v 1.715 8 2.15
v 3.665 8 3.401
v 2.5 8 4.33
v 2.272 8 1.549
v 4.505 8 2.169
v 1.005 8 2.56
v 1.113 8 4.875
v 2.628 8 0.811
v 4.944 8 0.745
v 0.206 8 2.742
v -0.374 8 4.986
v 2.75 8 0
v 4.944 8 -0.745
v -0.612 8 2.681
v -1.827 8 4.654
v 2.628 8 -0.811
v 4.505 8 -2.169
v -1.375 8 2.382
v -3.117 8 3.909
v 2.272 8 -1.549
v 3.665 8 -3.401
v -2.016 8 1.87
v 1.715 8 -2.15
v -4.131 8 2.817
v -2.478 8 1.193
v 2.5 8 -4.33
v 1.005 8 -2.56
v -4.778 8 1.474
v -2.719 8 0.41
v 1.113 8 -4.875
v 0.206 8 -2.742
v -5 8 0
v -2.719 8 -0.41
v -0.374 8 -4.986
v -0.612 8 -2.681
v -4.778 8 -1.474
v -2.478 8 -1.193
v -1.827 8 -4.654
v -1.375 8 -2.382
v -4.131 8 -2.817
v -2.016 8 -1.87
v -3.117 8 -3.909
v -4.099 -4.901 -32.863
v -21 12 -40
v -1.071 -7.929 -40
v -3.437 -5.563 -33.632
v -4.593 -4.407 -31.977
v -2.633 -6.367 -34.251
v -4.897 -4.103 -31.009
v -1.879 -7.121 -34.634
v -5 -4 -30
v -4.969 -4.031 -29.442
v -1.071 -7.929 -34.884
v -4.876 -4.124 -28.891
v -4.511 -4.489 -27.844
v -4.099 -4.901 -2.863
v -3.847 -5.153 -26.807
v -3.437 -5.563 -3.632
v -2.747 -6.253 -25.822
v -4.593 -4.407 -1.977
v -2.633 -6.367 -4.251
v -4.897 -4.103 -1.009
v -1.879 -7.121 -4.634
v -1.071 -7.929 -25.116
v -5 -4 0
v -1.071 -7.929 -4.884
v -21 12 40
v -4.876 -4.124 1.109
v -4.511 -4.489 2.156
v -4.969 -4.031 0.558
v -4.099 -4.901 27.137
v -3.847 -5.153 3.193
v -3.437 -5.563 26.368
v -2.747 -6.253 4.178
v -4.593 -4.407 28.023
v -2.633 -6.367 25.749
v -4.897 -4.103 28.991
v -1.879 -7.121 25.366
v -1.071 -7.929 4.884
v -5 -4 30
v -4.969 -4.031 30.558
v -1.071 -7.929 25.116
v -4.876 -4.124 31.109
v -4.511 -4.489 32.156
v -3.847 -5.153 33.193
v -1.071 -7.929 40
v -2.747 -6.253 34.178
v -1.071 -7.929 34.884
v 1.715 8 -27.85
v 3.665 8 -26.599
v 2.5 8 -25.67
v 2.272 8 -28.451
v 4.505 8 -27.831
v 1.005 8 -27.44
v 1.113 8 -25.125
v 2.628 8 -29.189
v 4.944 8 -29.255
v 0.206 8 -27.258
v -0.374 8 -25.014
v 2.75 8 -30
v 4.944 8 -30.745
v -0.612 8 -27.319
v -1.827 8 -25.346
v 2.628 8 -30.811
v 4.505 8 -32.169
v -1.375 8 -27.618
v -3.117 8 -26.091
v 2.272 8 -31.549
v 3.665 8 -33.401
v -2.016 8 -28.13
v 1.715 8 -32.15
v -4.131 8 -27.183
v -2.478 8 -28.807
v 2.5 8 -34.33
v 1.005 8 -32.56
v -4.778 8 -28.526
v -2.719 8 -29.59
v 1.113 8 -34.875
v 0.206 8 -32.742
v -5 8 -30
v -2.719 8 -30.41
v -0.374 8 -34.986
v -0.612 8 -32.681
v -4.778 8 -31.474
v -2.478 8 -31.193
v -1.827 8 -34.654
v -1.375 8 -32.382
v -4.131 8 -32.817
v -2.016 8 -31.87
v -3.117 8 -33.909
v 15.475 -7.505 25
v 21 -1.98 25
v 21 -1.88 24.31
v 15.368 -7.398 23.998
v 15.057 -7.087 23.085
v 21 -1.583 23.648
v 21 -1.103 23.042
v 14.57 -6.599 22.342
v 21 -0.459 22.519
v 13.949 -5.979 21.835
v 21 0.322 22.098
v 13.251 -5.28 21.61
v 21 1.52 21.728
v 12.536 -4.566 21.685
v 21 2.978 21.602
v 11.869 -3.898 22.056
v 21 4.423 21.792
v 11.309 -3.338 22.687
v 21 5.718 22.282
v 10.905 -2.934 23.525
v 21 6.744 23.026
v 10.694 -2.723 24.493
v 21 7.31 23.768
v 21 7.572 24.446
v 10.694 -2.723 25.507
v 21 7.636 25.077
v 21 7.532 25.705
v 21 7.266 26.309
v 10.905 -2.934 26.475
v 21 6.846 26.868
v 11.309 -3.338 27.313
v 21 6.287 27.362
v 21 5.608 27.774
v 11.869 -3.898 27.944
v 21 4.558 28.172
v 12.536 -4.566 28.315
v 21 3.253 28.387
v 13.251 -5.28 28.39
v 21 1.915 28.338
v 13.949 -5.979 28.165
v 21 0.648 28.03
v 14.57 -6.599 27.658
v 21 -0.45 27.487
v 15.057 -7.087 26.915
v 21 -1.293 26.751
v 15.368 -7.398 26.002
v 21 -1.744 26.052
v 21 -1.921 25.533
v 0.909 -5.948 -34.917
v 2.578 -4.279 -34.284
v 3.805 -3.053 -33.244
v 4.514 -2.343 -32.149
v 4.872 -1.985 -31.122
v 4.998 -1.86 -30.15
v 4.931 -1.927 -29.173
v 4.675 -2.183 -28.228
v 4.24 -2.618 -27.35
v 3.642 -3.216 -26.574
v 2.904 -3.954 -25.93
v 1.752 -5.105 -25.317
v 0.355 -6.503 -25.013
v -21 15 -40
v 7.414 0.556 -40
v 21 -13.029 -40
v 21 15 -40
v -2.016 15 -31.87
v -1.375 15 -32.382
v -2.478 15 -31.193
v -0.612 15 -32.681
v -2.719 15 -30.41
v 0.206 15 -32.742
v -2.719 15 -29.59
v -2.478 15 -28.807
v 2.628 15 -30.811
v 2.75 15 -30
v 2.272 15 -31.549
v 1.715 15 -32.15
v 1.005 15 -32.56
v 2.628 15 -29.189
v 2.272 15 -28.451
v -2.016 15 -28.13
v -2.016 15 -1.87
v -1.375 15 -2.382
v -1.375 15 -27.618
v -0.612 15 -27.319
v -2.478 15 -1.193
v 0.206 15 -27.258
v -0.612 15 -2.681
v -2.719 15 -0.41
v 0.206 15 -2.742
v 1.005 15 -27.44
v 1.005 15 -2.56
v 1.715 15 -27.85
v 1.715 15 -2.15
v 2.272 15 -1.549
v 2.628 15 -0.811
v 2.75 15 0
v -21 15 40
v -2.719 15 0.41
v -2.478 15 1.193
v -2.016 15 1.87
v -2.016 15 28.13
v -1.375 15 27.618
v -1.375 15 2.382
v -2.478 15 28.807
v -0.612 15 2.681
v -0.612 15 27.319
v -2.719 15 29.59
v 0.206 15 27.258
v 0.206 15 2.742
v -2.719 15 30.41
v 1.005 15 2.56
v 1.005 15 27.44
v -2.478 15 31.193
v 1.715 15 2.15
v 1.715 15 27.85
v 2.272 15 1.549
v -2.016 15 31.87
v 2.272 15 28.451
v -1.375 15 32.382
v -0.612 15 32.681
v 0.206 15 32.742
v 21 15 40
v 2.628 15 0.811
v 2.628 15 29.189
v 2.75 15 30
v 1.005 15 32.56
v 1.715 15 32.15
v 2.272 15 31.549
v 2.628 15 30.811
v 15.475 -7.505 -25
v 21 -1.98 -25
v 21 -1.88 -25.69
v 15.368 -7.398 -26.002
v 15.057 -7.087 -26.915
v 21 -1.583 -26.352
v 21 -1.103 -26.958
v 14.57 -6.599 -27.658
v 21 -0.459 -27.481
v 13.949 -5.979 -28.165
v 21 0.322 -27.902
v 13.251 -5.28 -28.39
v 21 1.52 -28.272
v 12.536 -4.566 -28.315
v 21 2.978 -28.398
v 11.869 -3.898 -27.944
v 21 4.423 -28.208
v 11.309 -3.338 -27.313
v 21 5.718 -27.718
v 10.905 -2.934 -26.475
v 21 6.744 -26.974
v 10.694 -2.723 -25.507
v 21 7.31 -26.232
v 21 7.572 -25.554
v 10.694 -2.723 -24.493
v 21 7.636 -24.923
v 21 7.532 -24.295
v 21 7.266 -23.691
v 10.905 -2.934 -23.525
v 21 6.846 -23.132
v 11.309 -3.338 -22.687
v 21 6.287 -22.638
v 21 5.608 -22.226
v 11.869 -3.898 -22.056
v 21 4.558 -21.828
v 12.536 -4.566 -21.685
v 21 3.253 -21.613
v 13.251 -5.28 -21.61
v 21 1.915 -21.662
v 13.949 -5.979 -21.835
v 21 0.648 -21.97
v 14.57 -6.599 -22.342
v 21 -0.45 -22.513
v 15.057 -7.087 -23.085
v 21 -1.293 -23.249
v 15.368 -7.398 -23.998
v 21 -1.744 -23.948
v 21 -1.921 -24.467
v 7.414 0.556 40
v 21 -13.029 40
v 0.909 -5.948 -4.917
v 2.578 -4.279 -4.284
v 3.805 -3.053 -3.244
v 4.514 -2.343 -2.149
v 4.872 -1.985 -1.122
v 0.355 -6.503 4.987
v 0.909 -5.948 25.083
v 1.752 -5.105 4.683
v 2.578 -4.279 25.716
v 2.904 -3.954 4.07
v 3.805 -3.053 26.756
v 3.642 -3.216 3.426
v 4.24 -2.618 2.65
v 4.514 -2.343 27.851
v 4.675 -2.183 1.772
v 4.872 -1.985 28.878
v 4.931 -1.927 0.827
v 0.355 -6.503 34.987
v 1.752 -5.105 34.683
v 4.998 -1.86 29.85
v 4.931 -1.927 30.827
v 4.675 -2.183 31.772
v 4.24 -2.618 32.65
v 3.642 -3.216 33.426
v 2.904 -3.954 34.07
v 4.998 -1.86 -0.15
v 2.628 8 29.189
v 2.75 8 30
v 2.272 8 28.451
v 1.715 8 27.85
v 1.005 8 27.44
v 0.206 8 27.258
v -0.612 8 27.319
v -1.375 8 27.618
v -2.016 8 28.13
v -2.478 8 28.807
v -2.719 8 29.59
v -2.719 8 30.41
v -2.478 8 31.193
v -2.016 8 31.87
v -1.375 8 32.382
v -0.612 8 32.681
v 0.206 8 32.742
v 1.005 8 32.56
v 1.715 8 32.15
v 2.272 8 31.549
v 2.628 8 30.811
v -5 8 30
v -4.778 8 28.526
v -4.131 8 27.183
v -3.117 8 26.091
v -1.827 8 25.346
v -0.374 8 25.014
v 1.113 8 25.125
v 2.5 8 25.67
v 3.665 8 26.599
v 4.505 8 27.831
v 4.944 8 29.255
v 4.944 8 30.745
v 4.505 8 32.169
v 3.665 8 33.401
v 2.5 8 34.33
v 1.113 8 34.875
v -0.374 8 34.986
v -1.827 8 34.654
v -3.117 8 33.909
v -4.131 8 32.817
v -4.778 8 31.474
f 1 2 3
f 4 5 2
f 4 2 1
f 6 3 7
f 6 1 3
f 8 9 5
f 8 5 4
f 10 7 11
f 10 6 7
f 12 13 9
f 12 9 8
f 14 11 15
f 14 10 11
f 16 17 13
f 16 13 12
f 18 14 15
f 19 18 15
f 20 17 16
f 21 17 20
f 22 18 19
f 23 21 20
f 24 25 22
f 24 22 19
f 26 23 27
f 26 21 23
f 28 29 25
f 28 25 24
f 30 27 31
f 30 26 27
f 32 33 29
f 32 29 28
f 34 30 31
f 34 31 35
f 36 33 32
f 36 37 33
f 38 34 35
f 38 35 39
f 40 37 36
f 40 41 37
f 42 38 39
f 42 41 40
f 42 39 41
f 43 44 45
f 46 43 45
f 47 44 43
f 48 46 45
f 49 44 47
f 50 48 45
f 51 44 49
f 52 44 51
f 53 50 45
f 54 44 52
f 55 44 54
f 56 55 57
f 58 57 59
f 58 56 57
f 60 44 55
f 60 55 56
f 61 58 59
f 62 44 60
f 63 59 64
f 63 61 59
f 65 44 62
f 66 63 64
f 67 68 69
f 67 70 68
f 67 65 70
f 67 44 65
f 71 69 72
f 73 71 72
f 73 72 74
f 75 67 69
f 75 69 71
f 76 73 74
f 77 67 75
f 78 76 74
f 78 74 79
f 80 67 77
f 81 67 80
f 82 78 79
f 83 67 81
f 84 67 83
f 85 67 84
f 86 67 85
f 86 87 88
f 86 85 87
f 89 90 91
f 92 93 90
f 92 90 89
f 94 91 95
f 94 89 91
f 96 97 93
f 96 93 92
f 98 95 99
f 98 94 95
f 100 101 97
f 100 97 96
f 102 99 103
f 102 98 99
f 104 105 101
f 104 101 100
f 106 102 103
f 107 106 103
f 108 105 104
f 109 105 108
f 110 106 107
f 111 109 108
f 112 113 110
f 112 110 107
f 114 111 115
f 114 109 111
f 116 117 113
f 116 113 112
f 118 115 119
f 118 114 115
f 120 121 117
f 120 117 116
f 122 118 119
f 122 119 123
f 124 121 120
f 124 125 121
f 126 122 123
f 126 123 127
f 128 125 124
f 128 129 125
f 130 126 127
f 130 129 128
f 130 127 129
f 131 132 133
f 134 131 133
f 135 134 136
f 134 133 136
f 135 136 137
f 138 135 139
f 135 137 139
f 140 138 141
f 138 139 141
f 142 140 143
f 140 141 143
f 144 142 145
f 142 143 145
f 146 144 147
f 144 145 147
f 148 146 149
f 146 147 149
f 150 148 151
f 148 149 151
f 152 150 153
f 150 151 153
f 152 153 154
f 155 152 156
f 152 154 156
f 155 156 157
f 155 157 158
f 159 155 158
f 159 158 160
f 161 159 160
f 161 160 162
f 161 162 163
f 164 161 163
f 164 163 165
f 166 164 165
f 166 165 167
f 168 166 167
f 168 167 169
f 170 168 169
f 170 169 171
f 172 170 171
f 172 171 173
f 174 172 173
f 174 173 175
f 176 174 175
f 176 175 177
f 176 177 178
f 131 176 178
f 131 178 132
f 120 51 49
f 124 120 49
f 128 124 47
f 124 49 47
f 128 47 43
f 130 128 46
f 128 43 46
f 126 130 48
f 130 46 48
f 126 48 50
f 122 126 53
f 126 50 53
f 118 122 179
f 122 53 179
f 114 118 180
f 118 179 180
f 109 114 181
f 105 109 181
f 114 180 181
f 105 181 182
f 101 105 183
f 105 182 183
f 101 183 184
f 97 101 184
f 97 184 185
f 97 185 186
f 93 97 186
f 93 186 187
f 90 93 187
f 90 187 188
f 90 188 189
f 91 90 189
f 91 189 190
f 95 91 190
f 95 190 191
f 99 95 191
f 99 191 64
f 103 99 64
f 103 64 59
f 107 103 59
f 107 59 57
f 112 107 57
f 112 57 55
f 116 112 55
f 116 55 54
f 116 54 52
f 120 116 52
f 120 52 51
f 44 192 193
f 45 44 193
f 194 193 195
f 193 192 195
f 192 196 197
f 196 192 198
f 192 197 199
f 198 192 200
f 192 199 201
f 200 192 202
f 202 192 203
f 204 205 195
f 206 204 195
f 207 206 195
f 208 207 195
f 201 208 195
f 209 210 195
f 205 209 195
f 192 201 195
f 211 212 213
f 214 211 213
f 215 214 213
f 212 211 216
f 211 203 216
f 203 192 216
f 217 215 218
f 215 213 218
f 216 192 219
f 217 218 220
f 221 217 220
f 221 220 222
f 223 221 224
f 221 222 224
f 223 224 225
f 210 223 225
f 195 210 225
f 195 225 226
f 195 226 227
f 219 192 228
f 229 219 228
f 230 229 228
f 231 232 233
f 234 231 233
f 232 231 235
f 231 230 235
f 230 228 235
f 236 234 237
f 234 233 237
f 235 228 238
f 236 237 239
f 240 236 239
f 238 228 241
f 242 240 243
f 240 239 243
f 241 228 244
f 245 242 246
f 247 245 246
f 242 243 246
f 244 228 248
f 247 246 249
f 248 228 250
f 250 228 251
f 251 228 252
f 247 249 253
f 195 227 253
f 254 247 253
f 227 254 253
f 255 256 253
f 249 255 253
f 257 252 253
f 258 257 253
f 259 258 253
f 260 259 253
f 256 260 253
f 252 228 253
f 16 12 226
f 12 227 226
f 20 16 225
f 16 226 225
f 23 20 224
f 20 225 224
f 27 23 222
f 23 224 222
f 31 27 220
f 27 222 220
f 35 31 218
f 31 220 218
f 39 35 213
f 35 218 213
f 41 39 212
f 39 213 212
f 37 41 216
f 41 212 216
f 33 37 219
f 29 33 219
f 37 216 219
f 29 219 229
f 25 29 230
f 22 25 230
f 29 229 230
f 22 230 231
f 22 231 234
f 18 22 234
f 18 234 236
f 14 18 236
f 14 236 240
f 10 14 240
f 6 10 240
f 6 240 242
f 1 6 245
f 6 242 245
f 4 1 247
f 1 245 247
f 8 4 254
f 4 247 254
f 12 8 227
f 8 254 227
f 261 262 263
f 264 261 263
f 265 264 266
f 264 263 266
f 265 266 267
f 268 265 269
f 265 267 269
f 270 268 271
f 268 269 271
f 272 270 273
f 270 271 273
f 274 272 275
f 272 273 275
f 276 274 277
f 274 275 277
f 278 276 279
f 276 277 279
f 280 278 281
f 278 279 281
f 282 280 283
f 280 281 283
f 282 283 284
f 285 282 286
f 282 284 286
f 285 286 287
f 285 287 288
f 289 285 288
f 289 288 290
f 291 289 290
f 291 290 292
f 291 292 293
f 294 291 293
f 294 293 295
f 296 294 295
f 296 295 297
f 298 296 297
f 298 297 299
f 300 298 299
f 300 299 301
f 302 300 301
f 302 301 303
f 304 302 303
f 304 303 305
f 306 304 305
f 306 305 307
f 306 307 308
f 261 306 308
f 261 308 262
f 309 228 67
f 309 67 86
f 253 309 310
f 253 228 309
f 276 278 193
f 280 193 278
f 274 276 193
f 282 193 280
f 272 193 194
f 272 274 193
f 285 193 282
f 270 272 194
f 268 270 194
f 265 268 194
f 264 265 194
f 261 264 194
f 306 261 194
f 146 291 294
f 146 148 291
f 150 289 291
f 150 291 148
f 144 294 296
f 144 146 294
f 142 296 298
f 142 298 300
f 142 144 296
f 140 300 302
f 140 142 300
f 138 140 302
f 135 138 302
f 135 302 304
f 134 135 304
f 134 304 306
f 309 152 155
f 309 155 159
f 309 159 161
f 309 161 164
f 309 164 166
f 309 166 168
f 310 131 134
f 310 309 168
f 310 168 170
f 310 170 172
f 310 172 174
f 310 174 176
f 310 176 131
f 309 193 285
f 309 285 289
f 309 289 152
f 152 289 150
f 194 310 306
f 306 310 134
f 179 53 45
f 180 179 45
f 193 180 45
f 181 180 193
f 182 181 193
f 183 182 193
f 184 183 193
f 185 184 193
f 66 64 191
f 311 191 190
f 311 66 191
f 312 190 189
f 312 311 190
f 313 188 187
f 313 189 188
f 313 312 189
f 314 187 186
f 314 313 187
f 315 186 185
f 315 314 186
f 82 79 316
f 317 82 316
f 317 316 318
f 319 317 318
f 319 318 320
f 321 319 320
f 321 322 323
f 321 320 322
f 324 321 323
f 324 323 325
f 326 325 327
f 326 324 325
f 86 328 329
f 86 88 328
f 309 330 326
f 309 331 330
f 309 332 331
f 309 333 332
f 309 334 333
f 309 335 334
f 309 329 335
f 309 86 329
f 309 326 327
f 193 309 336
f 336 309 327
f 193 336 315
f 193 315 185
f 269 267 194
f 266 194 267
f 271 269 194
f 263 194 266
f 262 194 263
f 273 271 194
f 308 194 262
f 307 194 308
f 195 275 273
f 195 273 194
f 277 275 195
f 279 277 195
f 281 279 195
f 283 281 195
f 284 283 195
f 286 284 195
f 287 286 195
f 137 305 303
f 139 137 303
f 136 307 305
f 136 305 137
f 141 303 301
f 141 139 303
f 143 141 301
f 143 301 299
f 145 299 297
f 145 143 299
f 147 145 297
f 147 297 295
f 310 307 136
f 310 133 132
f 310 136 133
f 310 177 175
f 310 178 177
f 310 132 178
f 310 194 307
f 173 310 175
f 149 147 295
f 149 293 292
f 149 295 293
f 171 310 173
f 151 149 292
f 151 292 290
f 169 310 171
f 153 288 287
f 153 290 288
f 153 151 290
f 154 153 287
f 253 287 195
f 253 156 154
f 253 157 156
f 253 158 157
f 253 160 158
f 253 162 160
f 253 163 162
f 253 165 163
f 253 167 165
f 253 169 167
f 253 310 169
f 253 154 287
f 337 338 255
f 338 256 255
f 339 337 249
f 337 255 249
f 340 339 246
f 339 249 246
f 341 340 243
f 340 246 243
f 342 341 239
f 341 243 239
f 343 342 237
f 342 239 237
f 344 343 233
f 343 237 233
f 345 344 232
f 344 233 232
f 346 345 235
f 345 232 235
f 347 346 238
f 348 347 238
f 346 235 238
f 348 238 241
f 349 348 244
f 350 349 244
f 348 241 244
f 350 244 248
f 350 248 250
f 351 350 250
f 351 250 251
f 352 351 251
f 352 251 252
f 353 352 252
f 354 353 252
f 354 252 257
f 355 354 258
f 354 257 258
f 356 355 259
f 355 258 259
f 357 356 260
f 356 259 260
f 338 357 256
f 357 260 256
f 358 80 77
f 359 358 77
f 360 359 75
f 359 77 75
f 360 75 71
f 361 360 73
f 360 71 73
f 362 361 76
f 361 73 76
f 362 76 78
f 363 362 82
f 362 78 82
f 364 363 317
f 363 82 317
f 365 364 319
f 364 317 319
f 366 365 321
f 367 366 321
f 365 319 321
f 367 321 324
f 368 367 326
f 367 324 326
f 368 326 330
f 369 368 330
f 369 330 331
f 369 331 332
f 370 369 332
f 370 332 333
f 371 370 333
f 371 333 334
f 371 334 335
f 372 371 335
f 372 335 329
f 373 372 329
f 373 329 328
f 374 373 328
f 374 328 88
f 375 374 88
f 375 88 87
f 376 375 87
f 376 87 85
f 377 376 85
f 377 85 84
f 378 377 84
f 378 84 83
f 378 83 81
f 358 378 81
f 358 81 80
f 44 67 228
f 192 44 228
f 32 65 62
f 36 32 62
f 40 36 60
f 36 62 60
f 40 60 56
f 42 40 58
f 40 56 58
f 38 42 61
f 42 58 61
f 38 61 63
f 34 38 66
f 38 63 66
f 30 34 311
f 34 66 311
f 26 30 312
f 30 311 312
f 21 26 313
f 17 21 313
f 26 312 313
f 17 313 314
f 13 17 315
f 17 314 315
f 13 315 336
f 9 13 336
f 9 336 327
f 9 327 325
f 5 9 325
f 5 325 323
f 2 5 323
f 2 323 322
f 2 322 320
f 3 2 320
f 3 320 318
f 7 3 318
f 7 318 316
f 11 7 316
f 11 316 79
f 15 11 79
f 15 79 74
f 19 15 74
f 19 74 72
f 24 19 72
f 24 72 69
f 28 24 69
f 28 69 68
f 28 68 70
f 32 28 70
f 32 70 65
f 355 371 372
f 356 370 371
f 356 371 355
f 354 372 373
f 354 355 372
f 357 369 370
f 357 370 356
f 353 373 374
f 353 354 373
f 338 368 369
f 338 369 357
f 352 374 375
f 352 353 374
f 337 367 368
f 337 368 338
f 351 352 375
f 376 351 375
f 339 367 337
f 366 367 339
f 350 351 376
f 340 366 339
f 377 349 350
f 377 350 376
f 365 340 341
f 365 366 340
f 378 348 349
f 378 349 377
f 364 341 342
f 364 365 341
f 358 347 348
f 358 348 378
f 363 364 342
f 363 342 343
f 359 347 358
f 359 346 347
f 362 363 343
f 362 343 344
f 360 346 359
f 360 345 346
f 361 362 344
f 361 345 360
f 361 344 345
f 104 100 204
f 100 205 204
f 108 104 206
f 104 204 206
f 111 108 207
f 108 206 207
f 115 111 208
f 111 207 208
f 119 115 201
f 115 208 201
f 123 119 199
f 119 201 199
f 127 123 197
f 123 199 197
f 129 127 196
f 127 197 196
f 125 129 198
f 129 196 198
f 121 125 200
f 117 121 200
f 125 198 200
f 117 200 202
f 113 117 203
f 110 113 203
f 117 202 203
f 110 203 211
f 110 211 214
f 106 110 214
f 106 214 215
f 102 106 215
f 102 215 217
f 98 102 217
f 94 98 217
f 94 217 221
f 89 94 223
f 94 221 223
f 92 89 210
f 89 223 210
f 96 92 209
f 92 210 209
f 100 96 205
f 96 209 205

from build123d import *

# Parameters (mm, degrees)
SKETCH_1_W                = 42
SKETCH_1_H                = 30
EXTRUDE_1_DEPTH           = 40
CUT_EXTRUDE_1_DEPTH       = 85.059502735
HOLE_WIZARD_1_D           = 5.5
HOLE_WIZARD_1_CBORE_D     = 10
HOLE_WIZARD_1_CBORE_DEPTH = 23
CUT_EXTRUDE_2_DEPTH       = 85.059502735
HOLE_WIZARD_M8_1_D        = 6.8
HOLE_WIZARD_M8_1_DEPTH    = 19.75
HOLE_WIZARD_M8_1_TIP      = 2.042926105


with BuildPart() as part:
    # 草图1 → 凸台-拉伸1 (new, symmetric)
    with BuildSketch(Plane.XY):
        Rectangle(SKETCH_1_W, SKETCH_1_H)
    extrude(amount=EXTRUDE_1_DEPTH, both=True)

    # 草图2 → 切除-拉伸1 (cut, through all)
    with BuildSketch(Plane.XY.offset(40)):
        Polygon((-21, 12), (6, -15), (-21, -15), align=None)
    extrude(amount=-CUT_EXTRUDE_1_DEPTH, mode=Mode.SUBTRACT)

    # 打孔尺寸根据内六角圆柱头螺钉的类型1 (through all)
    with Locations(Plane(origin=(0, -15, 0), x_dir=(-1, 0, 0), z_dir=(0, -1, 0))):
        with Locations((0, -30), (0, 30), (0, 0)):
            CounterBoreHole(HOLE_WIZARD_1_D / 2, HOLE_WIZARD_1_CBORE_D / 2, HOLE_WIZARD_1_CBORE_DEPTH)

    # 草图3 → 切除-拉伸2 (cut, through all)
    with BuildSketch(Plane.XY.offset(40)):
        Polygon((-1.071067812, -7.928932188), (7.414213562, 0.556349186), (22.970562748, -15), (6, -15), align=None)
    extrude(amount=-CUT_EXTRUDE_2_DEPTH, mode=Mode.SUBTRACT)

    # M8 螺纹孔1
    with Locations(Plane(origin=(3.985281374, 3.985281374, 0), x_dir=(-0.7071067811865477, 0.7071067811865474, 0), z_dir=(-0.7071067811865474, -0.7071067811865477, 0))):
        with Locations((-12.849242405, 25), (-12.849242405, -25)):
            Hole(HOLE_WIZARD_M8_1_D / 2, depth=HOLE_WIZARD_M8_1_DEPTH)
            with Locations((0, 0, -(HOLE_WIZARD_M8_1_DEPTH + HOLE_WIZARD_M8_1_TIP / 2))):  # 118° drill point
                Cone(0, HOLE_WIZARD_M8_1_D / 2, HOLE_WIZARD_M8_1_TIP, mode=Mode.SUBTRACT)


solid = part.part
